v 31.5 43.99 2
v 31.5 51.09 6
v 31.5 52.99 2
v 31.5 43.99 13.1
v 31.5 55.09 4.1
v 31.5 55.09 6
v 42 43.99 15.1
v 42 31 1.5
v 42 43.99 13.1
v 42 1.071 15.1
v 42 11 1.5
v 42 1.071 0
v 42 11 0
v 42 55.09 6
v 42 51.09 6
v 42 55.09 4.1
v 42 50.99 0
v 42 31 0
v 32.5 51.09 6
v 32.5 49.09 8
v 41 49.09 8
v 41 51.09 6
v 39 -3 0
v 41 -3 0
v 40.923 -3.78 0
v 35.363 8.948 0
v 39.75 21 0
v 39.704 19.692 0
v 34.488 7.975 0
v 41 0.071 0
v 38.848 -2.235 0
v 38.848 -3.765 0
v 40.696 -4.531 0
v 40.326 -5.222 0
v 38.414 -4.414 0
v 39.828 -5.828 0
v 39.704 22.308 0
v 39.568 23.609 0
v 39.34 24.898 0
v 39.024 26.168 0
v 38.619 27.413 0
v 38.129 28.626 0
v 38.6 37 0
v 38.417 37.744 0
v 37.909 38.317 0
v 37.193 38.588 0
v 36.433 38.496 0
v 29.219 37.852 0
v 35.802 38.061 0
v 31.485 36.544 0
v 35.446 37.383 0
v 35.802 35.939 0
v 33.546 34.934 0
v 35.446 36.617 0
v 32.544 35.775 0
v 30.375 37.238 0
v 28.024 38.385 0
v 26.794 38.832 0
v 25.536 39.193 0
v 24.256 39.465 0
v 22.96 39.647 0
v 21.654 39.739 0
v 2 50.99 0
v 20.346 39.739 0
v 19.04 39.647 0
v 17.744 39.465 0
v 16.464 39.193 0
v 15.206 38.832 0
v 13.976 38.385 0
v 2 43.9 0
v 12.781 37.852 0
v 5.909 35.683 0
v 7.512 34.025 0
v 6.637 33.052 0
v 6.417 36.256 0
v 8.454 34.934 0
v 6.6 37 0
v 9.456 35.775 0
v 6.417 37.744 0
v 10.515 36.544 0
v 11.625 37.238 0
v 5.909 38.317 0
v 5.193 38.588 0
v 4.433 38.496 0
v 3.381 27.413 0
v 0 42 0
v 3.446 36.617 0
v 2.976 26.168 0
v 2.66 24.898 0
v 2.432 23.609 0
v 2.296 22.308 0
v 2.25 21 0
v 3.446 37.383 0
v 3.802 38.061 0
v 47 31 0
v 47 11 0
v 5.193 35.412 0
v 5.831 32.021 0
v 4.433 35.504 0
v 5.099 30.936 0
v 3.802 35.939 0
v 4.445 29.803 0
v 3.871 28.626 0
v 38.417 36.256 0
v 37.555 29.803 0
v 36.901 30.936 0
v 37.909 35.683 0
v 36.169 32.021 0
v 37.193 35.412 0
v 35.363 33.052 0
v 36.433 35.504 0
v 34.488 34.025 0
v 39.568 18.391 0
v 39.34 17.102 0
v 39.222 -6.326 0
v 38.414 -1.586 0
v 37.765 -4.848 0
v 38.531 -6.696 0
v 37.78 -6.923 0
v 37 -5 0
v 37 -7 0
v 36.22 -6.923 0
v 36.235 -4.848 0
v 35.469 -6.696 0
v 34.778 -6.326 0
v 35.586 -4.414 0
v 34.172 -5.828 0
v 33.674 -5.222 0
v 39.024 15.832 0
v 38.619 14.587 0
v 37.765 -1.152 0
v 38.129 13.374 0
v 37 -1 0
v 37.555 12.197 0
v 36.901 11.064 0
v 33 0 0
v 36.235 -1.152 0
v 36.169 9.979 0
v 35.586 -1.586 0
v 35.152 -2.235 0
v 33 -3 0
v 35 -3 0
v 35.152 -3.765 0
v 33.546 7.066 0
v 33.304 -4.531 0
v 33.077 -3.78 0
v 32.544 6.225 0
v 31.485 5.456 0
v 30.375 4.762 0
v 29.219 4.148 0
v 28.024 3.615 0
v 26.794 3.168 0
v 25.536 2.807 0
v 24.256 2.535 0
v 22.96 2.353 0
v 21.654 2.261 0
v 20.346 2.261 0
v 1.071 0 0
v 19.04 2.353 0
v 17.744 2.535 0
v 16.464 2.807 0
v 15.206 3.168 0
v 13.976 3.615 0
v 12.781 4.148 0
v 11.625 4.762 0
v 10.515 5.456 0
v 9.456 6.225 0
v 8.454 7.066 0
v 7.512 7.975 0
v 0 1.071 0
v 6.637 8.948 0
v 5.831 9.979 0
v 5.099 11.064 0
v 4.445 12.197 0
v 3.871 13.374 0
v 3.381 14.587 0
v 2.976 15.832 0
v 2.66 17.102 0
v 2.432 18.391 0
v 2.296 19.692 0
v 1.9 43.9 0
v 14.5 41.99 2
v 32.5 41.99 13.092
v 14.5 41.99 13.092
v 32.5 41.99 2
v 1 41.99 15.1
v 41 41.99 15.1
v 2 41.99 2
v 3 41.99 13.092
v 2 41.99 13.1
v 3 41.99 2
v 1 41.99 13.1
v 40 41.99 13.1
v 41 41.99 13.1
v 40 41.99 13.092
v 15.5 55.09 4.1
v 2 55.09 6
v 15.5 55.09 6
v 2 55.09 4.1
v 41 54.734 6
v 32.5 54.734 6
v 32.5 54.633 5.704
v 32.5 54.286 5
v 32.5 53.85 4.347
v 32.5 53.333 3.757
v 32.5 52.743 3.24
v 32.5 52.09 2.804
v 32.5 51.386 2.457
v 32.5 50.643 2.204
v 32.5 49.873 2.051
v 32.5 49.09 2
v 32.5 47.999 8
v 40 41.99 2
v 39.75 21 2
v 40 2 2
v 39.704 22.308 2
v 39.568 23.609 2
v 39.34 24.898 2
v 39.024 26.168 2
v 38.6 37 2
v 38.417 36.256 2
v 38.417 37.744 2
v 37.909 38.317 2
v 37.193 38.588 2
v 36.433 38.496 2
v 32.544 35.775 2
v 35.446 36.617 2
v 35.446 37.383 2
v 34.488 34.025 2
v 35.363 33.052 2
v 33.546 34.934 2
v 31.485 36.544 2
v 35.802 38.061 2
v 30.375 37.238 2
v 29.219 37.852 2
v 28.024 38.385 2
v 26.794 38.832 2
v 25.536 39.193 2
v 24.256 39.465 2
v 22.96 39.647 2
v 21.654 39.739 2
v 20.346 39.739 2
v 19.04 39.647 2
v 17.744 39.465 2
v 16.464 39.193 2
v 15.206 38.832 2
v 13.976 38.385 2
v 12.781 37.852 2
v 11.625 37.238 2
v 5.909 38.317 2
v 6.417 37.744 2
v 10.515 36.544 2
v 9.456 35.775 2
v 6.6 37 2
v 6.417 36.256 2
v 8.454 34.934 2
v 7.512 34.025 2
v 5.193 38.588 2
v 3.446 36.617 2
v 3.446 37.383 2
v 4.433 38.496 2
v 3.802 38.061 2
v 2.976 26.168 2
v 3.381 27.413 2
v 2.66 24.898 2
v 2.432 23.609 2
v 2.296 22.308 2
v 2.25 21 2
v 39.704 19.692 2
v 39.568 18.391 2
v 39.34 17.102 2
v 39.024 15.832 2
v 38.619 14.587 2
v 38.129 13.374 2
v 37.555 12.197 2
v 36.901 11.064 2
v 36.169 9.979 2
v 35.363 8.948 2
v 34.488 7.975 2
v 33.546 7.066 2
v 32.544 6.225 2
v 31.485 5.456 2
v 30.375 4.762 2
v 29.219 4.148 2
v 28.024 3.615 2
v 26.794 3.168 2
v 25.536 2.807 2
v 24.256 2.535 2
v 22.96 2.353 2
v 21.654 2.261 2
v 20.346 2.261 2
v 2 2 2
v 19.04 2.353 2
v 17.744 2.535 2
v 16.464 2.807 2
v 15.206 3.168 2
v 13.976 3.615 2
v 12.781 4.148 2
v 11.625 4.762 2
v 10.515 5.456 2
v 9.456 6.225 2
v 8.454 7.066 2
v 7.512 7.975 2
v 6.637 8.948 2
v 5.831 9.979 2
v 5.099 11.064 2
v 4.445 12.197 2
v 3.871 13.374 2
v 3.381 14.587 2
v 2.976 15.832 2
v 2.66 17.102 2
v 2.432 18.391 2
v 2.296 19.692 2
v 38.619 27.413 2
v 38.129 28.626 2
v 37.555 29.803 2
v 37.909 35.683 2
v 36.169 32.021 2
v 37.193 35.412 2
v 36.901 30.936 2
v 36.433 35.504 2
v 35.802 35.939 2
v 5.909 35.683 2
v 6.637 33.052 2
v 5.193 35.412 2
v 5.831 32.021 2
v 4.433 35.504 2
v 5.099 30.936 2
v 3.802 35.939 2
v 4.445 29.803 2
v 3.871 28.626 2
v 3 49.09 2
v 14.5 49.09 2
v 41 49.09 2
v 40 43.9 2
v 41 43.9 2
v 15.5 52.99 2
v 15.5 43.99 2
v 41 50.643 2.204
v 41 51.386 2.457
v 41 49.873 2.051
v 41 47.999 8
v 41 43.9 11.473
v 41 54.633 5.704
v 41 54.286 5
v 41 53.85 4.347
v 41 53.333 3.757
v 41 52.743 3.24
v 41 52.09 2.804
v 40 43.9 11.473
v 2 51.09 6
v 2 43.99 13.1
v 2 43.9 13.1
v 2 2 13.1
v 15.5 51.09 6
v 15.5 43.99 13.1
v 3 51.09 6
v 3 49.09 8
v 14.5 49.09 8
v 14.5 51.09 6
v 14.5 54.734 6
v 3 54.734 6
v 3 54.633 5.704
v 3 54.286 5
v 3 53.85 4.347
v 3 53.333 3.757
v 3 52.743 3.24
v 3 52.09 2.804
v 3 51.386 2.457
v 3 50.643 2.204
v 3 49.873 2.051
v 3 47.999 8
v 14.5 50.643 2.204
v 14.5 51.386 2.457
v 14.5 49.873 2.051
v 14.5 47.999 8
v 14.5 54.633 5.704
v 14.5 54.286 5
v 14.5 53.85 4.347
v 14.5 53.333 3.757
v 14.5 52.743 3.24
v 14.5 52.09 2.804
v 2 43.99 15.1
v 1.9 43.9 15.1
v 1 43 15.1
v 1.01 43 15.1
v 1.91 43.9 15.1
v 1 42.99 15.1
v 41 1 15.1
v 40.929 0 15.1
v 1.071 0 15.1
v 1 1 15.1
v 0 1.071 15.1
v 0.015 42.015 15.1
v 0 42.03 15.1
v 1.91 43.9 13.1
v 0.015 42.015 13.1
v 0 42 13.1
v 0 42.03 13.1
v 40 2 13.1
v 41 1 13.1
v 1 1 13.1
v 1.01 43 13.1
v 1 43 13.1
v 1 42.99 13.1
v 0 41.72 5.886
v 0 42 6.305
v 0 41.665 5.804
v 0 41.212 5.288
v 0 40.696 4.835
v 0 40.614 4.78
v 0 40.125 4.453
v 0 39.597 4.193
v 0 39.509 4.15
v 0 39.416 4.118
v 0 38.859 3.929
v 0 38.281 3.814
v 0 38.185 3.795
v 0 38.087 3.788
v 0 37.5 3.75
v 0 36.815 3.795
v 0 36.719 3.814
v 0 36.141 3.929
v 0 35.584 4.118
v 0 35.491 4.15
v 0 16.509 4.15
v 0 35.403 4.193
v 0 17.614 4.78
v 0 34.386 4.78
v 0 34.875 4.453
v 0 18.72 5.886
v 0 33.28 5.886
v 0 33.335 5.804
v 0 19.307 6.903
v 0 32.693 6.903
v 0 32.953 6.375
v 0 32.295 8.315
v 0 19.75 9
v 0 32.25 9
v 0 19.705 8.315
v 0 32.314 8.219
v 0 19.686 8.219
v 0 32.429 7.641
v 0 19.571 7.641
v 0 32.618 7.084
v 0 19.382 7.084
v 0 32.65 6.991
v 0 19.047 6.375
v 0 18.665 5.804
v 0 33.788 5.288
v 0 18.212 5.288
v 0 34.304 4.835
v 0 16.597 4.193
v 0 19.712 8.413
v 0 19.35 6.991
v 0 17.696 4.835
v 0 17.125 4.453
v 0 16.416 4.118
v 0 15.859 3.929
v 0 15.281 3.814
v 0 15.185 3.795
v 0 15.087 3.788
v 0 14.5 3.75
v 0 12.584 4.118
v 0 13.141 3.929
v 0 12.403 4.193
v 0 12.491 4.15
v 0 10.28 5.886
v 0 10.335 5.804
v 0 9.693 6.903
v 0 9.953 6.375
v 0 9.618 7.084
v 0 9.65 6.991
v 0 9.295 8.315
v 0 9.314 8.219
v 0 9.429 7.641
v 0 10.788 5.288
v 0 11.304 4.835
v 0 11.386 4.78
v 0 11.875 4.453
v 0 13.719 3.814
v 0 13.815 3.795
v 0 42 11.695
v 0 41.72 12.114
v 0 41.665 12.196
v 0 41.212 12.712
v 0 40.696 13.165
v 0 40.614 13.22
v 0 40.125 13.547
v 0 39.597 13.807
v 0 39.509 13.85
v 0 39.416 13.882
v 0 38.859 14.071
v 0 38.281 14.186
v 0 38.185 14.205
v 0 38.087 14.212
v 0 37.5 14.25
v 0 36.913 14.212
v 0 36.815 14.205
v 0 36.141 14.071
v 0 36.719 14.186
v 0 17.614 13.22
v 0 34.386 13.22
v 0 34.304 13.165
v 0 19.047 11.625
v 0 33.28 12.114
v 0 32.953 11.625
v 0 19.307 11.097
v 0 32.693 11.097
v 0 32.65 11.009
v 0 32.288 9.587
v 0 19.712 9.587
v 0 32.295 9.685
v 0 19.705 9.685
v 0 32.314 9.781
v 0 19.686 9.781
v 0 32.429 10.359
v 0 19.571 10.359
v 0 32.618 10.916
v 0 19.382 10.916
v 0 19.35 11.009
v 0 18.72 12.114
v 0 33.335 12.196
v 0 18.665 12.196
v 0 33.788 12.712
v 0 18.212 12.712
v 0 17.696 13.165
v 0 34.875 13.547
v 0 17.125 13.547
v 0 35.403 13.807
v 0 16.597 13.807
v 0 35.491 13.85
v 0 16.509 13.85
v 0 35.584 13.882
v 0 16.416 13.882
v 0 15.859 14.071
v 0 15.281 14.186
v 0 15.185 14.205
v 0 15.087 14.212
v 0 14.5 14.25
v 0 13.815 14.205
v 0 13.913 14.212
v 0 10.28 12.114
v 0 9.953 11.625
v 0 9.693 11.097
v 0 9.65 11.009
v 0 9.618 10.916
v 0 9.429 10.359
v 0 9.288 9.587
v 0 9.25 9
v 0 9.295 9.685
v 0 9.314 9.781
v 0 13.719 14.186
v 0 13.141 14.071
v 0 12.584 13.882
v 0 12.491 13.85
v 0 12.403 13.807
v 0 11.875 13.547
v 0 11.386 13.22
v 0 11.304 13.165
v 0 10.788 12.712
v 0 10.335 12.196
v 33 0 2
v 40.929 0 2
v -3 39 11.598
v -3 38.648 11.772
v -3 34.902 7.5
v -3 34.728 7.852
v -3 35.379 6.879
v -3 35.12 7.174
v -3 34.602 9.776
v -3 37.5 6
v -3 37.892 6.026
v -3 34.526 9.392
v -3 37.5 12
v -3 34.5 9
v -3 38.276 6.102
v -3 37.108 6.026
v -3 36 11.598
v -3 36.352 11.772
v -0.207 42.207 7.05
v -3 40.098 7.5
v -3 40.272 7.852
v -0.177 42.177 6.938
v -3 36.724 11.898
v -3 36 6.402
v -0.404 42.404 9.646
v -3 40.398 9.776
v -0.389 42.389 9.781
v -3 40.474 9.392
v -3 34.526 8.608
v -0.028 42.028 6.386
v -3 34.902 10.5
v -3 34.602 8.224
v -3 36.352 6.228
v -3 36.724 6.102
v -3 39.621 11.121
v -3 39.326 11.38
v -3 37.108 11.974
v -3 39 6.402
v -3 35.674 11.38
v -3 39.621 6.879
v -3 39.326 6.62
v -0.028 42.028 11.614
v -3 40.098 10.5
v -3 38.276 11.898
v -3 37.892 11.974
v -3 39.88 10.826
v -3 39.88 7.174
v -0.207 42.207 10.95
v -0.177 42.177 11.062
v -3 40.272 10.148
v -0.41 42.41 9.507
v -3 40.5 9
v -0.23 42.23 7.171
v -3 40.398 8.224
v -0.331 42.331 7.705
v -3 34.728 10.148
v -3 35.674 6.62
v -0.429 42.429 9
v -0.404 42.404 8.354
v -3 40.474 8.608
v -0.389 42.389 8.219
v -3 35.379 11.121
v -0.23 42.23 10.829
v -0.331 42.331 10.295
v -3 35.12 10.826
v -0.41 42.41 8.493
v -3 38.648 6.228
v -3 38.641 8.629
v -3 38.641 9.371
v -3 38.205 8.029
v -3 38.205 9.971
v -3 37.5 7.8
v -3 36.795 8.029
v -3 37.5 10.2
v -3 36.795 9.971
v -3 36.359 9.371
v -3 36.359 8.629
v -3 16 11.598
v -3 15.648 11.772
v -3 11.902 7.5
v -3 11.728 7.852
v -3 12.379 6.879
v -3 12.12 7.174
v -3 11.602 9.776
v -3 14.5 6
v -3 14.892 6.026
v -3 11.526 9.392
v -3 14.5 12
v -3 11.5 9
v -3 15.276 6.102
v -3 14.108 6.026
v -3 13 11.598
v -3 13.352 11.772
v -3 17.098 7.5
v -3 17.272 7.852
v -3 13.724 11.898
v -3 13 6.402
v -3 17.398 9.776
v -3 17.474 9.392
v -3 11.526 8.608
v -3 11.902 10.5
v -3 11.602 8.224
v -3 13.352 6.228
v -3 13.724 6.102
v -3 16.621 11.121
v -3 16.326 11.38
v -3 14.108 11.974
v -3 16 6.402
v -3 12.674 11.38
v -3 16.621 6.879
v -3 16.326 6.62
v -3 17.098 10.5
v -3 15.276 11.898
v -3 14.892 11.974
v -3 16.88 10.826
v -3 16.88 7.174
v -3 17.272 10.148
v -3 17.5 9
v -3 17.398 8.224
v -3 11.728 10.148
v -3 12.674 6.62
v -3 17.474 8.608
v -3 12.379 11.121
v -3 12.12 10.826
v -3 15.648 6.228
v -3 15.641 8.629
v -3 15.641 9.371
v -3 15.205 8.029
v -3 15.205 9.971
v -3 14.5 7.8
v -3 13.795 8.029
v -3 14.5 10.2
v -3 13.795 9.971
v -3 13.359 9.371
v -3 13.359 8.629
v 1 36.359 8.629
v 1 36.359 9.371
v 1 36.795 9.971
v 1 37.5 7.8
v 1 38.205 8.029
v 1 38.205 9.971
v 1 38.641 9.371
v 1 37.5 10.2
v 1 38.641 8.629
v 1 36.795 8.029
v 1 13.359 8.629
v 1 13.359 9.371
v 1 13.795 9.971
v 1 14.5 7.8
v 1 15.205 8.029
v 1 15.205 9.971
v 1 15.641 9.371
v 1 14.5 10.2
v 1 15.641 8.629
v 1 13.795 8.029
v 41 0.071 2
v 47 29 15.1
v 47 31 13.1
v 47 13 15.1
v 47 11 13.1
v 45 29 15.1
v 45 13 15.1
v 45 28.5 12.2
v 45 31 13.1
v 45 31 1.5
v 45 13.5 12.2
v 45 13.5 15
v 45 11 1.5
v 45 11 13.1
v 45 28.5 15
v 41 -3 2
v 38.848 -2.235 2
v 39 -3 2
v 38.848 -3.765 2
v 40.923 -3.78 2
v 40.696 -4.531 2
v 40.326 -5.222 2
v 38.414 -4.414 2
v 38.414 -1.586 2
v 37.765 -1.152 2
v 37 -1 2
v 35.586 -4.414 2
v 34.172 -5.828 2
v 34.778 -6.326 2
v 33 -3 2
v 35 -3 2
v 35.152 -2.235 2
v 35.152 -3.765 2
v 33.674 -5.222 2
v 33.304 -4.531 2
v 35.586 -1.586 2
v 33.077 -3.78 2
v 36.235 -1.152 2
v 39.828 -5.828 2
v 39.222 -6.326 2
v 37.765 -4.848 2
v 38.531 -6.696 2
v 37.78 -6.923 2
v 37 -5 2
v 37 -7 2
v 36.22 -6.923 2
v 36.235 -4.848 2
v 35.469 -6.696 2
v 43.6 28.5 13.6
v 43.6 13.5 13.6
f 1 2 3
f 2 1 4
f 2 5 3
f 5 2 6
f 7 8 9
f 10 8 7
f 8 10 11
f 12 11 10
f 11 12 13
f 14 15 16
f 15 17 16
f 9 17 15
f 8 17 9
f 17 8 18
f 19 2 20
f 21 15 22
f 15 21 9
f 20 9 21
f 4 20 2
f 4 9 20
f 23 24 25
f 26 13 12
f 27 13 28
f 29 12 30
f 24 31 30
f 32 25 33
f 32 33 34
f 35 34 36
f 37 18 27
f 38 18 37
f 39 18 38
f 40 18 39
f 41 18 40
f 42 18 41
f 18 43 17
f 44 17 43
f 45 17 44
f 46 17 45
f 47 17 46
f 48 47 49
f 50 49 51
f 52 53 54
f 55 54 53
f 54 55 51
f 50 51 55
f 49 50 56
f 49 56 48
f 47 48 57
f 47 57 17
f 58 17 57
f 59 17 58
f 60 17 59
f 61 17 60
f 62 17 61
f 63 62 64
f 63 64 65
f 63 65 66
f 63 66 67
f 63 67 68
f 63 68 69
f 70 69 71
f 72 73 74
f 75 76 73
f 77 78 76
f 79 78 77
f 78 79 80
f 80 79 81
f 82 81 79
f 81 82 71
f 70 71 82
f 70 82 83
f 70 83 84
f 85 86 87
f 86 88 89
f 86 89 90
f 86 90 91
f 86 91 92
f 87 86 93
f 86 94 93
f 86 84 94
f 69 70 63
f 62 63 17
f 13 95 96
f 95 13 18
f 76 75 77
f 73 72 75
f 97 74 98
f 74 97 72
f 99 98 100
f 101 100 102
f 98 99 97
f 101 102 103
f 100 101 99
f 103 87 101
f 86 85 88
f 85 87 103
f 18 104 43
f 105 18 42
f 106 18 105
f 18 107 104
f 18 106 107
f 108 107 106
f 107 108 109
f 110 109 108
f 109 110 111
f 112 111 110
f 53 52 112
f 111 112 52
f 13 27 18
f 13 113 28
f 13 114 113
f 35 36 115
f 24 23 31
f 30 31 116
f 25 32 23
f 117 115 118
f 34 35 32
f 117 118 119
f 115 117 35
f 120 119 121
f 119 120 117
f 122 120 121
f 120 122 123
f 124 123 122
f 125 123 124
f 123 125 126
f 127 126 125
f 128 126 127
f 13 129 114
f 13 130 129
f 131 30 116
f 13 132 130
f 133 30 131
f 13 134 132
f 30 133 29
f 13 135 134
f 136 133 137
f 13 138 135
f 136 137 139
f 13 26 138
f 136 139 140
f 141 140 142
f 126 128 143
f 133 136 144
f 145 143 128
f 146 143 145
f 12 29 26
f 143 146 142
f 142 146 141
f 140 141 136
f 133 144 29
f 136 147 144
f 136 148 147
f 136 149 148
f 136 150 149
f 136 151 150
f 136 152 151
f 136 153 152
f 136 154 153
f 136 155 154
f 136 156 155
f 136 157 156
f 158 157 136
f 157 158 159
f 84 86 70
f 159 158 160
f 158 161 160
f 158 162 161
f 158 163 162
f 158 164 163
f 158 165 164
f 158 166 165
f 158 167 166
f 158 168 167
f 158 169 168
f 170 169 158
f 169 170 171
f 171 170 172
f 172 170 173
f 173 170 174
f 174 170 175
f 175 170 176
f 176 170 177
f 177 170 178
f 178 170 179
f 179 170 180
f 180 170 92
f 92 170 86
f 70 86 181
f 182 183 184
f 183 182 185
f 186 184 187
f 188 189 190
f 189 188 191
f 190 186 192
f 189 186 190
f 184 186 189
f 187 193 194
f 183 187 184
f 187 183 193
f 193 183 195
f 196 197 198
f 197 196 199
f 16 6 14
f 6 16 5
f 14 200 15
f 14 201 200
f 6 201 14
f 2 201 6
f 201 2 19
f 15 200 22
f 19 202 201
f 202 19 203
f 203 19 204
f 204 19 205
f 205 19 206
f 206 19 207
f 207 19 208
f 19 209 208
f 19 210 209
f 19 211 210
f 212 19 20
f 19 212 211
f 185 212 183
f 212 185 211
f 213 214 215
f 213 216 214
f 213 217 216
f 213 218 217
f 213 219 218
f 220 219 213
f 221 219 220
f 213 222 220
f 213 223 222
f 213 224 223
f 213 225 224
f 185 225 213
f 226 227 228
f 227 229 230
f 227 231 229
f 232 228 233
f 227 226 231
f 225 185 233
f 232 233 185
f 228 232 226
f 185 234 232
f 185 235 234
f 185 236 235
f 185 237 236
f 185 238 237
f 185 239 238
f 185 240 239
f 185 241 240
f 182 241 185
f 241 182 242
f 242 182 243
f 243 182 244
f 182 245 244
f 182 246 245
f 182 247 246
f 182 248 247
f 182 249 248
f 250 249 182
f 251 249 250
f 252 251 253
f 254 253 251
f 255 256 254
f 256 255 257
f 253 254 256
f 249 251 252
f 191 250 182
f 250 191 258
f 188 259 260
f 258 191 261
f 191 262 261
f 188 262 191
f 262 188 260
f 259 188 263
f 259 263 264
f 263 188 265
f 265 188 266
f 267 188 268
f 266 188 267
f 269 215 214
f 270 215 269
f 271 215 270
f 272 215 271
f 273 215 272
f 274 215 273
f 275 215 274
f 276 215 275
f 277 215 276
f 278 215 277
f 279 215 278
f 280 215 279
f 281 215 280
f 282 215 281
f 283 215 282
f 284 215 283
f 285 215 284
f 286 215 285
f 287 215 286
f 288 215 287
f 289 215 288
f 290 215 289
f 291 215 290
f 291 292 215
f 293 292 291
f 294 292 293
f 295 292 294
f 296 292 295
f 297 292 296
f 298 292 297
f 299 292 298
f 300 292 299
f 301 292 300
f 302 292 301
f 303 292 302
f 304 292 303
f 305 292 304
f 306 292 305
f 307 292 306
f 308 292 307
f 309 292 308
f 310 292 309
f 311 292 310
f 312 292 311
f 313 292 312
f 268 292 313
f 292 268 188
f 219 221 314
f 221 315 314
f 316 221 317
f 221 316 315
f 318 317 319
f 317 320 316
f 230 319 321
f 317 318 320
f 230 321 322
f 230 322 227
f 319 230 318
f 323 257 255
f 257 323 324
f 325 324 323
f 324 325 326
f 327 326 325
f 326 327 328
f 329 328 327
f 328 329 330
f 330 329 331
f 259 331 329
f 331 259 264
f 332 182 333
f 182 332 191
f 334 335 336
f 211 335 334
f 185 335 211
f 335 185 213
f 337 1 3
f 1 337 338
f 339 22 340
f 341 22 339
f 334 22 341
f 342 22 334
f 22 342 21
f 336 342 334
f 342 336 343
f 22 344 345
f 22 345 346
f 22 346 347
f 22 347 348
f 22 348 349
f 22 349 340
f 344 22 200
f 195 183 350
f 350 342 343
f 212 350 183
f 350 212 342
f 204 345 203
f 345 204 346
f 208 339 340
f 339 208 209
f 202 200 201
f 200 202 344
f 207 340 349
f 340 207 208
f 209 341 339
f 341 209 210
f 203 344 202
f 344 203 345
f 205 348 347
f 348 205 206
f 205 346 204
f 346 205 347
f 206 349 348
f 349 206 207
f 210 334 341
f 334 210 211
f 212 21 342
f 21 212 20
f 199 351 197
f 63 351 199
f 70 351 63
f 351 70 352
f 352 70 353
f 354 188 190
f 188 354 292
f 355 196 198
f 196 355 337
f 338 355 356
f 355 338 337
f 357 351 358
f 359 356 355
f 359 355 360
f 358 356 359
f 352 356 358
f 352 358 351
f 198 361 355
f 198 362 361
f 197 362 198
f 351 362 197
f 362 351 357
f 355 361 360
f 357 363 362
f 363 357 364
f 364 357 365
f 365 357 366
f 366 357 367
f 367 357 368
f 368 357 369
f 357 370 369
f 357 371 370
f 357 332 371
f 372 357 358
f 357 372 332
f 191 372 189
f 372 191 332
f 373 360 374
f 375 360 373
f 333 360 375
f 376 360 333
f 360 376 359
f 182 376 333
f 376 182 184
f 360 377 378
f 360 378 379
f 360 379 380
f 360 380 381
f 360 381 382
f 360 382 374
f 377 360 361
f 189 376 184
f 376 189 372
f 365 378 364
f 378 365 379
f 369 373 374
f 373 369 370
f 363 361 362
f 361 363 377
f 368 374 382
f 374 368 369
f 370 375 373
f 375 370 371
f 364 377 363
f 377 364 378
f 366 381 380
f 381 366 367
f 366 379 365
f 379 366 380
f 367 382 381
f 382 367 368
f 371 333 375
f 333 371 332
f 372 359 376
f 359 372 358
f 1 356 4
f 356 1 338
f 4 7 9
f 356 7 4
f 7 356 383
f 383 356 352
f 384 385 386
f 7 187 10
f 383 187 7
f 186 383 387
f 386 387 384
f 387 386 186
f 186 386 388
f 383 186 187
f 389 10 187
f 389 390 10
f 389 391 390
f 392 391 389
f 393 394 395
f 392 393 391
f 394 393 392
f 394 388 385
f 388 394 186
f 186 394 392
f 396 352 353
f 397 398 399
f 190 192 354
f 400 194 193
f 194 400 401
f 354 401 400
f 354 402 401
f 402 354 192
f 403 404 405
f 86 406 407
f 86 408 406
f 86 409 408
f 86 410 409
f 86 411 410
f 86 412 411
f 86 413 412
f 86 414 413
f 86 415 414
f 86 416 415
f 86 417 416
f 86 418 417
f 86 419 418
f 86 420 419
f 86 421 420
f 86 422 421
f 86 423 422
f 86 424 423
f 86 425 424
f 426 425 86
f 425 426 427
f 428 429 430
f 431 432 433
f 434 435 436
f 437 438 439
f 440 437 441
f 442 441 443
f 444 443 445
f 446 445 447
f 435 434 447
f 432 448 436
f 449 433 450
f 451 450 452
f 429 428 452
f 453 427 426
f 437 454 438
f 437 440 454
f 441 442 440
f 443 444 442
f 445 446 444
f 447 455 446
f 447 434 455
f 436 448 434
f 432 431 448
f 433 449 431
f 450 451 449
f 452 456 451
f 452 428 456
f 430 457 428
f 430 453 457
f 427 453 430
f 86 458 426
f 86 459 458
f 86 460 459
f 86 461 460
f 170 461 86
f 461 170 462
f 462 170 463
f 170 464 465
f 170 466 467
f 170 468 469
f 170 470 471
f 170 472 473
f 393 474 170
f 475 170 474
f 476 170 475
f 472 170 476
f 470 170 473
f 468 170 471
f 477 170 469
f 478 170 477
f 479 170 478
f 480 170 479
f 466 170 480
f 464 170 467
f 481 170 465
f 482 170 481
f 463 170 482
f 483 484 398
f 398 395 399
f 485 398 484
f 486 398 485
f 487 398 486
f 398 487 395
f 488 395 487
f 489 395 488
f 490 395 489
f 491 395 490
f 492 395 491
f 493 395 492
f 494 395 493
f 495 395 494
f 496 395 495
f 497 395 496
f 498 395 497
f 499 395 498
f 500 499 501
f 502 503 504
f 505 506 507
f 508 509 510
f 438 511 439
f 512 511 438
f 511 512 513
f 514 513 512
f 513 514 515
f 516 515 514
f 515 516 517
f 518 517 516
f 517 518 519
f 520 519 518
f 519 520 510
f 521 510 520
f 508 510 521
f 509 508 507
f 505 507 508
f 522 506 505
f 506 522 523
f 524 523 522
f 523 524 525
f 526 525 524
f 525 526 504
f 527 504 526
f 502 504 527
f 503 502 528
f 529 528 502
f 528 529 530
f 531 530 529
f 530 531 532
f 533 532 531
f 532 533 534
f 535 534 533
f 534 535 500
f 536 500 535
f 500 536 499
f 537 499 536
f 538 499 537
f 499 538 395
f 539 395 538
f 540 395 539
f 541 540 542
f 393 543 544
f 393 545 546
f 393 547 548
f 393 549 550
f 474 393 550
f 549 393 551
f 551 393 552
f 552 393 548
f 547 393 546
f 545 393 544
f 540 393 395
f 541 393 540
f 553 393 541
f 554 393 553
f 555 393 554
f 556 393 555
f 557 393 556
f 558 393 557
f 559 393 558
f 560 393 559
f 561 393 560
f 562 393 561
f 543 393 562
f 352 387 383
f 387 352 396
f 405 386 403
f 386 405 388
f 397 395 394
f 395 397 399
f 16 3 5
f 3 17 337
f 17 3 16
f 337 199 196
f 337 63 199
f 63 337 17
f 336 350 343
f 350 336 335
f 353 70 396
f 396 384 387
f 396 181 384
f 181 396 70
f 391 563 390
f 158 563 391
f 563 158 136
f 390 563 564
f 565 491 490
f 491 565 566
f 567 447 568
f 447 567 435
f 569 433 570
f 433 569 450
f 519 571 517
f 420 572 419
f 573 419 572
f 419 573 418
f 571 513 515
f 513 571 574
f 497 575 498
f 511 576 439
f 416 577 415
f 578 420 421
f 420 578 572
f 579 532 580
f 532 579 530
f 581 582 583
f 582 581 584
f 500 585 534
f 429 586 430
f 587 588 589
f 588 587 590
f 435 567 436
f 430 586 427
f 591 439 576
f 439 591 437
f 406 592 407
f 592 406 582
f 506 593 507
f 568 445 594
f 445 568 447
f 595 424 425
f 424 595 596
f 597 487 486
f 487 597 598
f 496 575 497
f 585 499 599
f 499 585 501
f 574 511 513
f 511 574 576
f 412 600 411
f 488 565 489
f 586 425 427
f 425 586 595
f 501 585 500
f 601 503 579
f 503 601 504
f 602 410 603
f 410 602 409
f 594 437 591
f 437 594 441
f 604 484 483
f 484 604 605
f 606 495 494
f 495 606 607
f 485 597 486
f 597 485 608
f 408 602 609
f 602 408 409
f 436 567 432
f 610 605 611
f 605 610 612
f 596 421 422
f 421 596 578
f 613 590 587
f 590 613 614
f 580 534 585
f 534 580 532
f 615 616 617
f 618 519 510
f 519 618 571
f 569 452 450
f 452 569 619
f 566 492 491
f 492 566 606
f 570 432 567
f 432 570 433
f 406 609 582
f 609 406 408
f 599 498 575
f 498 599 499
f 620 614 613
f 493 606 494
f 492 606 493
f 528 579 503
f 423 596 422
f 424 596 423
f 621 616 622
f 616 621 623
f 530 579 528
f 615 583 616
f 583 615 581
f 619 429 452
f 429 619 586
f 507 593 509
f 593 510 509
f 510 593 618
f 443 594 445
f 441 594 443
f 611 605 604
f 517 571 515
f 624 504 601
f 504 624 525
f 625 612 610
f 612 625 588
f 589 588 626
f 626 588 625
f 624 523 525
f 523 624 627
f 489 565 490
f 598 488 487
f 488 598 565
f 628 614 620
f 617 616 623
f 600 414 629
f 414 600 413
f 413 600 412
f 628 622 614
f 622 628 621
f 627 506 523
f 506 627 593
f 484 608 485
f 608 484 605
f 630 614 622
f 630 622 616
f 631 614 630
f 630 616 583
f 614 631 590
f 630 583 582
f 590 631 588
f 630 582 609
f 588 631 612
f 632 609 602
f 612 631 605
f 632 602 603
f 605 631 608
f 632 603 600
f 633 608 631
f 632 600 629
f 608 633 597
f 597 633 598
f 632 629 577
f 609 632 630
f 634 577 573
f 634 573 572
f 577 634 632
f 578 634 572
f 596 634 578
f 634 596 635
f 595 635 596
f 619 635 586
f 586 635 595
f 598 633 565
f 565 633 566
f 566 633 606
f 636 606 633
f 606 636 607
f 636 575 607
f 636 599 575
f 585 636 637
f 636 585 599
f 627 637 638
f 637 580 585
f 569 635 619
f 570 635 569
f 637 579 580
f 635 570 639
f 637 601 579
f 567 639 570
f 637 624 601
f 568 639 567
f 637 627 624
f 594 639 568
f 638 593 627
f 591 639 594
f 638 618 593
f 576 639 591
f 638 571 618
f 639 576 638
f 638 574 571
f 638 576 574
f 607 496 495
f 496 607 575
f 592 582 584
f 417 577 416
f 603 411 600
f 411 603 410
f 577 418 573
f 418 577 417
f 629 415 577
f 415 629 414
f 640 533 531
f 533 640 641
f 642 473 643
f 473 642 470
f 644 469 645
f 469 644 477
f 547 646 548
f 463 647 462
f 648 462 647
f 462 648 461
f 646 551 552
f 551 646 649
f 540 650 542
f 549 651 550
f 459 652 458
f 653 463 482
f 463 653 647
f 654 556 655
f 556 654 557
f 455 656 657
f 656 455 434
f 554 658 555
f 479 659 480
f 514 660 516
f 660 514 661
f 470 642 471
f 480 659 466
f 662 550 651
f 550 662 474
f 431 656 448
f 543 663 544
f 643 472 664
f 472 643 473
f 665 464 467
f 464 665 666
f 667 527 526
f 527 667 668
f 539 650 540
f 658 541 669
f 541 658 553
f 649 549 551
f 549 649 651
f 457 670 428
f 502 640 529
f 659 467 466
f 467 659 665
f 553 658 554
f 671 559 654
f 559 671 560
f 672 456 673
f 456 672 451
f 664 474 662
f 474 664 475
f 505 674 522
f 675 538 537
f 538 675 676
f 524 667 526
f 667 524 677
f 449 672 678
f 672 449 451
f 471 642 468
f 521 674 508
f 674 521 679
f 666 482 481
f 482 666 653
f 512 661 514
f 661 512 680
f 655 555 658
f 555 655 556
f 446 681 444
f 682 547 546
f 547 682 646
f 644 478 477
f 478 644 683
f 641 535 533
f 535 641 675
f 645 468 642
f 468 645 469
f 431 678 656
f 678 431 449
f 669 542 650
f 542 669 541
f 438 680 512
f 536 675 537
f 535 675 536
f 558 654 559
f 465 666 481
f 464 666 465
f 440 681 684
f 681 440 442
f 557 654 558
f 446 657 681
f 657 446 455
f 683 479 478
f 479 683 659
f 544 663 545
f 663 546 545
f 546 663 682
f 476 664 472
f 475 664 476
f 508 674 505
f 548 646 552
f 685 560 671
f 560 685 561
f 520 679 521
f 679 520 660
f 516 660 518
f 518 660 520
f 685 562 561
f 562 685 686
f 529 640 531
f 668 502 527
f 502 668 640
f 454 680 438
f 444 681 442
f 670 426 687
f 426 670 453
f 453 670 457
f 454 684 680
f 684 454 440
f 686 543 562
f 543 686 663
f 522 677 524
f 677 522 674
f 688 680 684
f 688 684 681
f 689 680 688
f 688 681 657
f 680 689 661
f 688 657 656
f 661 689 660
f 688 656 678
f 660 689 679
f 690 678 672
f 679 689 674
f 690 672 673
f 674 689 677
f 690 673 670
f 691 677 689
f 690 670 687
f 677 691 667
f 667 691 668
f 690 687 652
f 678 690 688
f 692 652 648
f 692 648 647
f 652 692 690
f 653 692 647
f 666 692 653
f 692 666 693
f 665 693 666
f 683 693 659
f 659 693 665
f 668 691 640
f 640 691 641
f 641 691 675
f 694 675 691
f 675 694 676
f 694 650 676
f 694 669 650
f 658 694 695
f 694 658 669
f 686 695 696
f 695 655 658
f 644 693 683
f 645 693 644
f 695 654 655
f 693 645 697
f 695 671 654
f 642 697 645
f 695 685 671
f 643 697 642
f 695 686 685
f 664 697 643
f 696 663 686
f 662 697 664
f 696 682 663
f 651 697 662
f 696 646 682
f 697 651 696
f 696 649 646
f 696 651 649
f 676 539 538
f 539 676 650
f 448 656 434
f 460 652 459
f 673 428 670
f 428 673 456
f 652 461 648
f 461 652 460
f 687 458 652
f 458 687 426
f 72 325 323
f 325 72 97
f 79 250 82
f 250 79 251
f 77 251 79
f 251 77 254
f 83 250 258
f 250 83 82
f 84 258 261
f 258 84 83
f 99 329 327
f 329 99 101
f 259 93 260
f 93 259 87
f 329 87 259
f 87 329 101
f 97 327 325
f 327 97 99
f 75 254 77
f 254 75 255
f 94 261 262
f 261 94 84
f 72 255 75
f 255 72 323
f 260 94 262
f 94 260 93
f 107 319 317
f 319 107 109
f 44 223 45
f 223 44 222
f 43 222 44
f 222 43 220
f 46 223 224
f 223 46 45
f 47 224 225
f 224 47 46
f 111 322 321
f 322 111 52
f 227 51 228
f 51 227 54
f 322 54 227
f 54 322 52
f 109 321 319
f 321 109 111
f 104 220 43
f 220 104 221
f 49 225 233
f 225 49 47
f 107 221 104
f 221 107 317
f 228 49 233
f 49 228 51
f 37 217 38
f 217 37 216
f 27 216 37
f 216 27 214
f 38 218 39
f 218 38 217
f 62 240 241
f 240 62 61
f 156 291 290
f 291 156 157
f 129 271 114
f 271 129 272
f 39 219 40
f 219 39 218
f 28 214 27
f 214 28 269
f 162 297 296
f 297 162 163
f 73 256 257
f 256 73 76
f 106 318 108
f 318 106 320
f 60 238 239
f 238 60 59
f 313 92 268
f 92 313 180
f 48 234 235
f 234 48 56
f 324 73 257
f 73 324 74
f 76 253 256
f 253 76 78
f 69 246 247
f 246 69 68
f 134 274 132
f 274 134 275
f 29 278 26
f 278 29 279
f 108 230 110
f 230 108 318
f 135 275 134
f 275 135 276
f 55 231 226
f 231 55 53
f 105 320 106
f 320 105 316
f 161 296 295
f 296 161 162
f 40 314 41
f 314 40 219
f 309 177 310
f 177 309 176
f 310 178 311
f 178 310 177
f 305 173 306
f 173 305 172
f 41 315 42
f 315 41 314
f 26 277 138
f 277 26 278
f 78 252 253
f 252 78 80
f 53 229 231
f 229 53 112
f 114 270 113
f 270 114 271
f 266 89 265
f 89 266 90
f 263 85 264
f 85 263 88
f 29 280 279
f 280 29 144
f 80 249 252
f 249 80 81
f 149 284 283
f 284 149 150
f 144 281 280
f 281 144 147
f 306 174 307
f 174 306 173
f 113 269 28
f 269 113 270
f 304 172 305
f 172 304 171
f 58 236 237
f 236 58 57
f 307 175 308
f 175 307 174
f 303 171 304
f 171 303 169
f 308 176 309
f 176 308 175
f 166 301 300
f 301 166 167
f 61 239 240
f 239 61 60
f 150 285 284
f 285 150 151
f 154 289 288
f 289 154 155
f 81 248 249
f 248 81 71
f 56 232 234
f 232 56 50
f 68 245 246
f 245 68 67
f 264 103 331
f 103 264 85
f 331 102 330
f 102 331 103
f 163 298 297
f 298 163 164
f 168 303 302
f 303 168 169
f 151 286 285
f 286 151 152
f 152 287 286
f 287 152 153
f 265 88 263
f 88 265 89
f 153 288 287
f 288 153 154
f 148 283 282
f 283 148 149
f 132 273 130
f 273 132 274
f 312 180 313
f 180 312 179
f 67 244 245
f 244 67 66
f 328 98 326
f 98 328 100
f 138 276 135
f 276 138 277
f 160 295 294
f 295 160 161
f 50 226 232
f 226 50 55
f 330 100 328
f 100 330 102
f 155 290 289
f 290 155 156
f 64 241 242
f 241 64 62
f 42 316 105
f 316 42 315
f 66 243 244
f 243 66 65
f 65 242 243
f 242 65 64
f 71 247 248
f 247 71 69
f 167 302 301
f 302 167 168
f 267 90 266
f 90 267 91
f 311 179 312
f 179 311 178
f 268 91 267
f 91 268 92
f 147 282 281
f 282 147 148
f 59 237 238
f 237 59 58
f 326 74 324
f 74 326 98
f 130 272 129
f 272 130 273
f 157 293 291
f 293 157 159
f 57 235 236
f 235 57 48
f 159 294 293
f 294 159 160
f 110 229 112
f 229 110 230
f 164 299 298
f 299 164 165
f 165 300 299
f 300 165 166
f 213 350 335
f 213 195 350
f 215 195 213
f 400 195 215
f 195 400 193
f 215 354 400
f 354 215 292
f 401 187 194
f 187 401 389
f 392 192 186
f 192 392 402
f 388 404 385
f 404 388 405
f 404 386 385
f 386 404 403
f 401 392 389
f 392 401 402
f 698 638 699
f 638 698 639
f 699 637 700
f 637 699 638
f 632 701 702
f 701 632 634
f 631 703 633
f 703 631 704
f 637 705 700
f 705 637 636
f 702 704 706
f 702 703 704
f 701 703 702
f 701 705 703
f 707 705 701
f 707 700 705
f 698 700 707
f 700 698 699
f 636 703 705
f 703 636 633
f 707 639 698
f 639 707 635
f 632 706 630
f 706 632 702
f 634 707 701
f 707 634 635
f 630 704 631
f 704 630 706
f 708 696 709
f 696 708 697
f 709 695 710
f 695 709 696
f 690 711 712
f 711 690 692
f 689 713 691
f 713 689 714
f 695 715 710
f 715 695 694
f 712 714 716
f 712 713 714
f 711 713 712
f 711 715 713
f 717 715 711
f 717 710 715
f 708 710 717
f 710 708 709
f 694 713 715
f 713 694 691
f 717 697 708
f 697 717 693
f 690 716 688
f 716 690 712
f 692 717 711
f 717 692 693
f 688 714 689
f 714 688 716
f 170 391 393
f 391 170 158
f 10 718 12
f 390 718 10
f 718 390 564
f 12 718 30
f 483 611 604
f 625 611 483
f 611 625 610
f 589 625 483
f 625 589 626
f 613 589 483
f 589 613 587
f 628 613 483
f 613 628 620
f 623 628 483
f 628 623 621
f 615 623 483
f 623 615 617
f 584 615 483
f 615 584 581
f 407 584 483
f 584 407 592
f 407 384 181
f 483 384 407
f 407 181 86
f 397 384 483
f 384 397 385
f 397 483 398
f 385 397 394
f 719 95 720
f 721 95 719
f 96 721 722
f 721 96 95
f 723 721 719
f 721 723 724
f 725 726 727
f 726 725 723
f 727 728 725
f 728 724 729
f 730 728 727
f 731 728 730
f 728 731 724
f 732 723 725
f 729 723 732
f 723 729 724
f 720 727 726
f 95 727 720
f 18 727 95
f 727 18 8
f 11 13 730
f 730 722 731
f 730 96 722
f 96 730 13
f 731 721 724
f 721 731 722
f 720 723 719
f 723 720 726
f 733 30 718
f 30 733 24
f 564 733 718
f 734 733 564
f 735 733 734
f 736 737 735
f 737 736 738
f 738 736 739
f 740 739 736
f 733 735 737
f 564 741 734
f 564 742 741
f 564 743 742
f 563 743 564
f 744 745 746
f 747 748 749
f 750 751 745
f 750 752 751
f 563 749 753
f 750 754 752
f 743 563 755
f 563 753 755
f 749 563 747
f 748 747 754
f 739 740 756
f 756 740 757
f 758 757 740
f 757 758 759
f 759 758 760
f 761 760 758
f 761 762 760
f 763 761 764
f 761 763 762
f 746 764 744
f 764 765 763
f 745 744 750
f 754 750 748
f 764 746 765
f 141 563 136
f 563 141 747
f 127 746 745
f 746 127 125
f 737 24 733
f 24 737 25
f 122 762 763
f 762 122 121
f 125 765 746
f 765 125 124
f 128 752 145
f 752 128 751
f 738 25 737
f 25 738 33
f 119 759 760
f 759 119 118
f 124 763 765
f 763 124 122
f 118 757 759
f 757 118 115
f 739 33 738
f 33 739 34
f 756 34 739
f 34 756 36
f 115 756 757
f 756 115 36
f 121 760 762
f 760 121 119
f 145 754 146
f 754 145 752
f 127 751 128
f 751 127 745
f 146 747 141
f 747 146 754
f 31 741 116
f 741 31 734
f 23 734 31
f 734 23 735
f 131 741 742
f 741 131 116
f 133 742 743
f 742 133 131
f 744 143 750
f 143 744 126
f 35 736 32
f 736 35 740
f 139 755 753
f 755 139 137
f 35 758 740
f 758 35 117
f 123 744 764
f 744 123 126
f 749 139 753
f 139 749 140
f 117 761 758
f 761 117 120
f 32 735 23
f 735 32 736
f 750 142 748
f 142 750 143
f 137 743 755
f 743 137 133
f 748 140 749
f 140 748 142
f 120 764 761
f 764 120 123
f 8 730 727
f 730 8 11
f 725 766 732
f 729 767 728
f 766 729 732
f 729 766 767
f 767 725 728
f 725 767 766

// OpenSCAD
// Original design by Matt (iamburny)
// Changes by dc42:
// 1. Increased thickness of cable trap from 1.5mm to 2mm because mine broke
// 2. Replaced tie wrap T at top centre by tie wrap hole at top right

$fs=0.8; // def 1, 0.2 is high res
$fa=4;//def 12, 3 is very nice
%translate([0,0,-0.5])cube([200,200,1],center=true); //build platform

irSensorOffset = 0.5;
sc = 32; //Screw Centres
wall=2;
hole = 37.5;  //fan hole
x=42;
y=x;
z=15.10;
heo = 2.5; //hot end offset
hbr = 16; //heat block recess

size=11; // size of the ball joint
joint_spacing =0; // some space between them?
joint_thickness = 3; // thickness of the arms - was 2
joint_arms = 2; // how many arms do you want?
arm_width = 5; // actually: how much is removed from the arms Larger values will remove more - was 10

ventB=(x/2)-(hbr/2)+heo-2;
ventS=(x/2)-(hbr/2)-heo;

module ball() {
	sphere(r=size);
	translate([0,0,-size]) cylinder(r1=8,r2=6,h=3);
	translate([0,0,-size-3]) cylinder(r=8,h=3);
}

module joint() {
	difference() 	{
		sphere(r=size+joint_spacing+joint_thickness);
		sphere(r=size+joint_spacing);
		translate([0,0,-size-3]) cube([size+joint_spacing+joint_thickness+25,size+joint_spacing+joint_thickness+25,18],center=true);
		for(i=[0:joint_arms])
		{
			rotate([0,0,360/joint_arms*i]) translate([-arm_width/2,0, -size/2-4])
				cube([arm_width,size+joint_spacing+joint_thickness+20,size+6]);
		}
	}
	translate([0,0,size-0]) cylinder(r2=12,r1=12,h=5);

}

module prism(l, w, h) {
	translate([0, l, 0]) rotate( a= [90, 0, 0]) 
	linear_extrude(height = l) polygon(points = [
		[0, 0],
		[w, 0],
		[0, h]
	], paths=[[0,2,1]]);
}

module vHole(len) {
	difference() {
		union() {
			cube([10-6,len,6]);
			translate([10-6,len,6]) rotate([90,0,0]) cylinder(len,6,6);
		}
		translate ([-7,-1,6]) cube([16,len+2,10]);
		translate ([-7,-1,0]) cube([6,len+2,7]);
	}
}

//Vents
translate([x,y-0.01,0]) rotate([0,0,90]) {
	difference() {
		union() {
			difference() { //Small Vent
				union() {
					prism(ventS,z,z);
					translate([z-6,0,0]) cube([4,ventS,6]); //tip
				}
				difference() {
					translate([-.01,wall/2,wall]) prism(ventS-wall,z-wall, z-wall*2);
					translate([6,0,0]) cube([6,ventS,6]);
				}
				translate([z-12,wall-1,wall]) vHole(ventS-(wall));
			}

			translate([0,ventS+hbr,0]) { 
				difference() { //Big Vent
					union() {
						prism(ventB,z,z);
						translate([z-6,0,0]) cube([4,ventB,6]);
					}
					difference() {
						translate([-.01,wall/2,wall]) prism(ventB-wall,z-wall,z-wall*2);
						translate([6,0,0]) cube([6,ventB,6]);
					}
					translate([z-12,wall-1,wall]) vHole(ventB-(wall));
				}
			}
			
			cube([z-2,y-2,wall]); //vent Base
			translate([0,ventS,wall]) cube([wall,hbr,z-(wall*2)]); //vent join			
			
			difference() {
				translate([0,0,z-wall]) cube([wall,y,wall]); //top of slope edging strip
				translate([2,y-2,-1]) rotate([0,0,45]) cube([2.8,2.8,z+2]); //bottom right bevel
			}
		}
		translate([9,-1,0]) rotate([0,45,0]) cube([10,y+2,10]); //vent bottom bevel
	}
}

//Body
difference() {
	union() {
		cube([x,y+1.9,z]); //outer block
	translate([-3,((x-sc)/2) + sc + irSensorOffset ,9]) rotate([0,90,0]) cylinder(4,3,6);	// sensor board mount
	translate([-3,((x-sc)/2) + sc + irSensorOffset - 23,9]) rotate([0,90,0]) cylinder(4,3,6);	// sensor board mount	

	}
	translate([x/2,x/2,-.1]) cylinder(20,hole/2,hole/2); //fan hole
	
	translate([wall,wall,2]) cube([x-(wall*2), x, 20]); //heatsink hole
	translate([wall-1,wall-1,z-2]) cube([x-(wall), x, 20]); //heatsink recess
	for(xp = [0:1]) { //2 x screw holes
		translate([((x-sc)/2) + (xp*sc),((x-sc)/2) + sc,-.1]) cylinder(3,1.6,1.6);
	}
	
	translate([-4,((x-sc)/2) + sc + irSensorOffset,9]) rotate([0,90,0]) cylinder(h=5,r=1.2);	// sensor board hole
	translate([-4,((x-sc)/2) + sc + irSensorOffset - 23,9]) rotate([0,90,0]) cylinder(h=5,r=1.2);	// sensor board hole
	
	translate([0,-6,-1]) rotate([0,0,45]) cube([5,5,z+2]); // top bevel
	translate([x,-6,-1]) rotate([0,0,45]) cube([5,5,z+2]); //top bevel
	translate([0,y,-1]) rotate([0,0,45]) cube([2.7,2.7,z+2]); //bottom right bevel
}

//Cable Traps
translate([x,(y/2)-10,0]) cube([wall*2,20,1.5]); //right cable trap
difference() {
	translate([x+3,(y/2)-10,0]) cube([2,20,z]); //right cable trap
	translate([x+2,(y/2)-10,z-2]) rotate([45,0,0]) cube(3); //right cable trap bevel
	translate([x+2,y-11,z-2]) rotate([45,0,0]) cube(3); //right cable trap bevel
}
translate([x+1.6,(y/2)-7.5,z-1.5]) rotate([0,45,0]) cube([2,15,2]); //right cable trap catch


//Tie Wrap hole
difference() {
	union() {
		translate([x-9,-3,0]) cube([8,4,2]);
		translate([x-5,-3,0]) cylinder(r=4,h=2);
	}
	translate([x-5,-3,-1]) cylinder(r=2,h=4);
}

/*Ball Joint
difference() {
	union() {
		rotate([0,90,0]) scale(.5)  translate([-size+1,size,97]) ball();
		//translate([20,20,2.4]) scale(.5) joint();
	}
	translate([0,0,-6]) cube([100,100,6]);
	translate([20,20,2.4]) cylinder(20,1.5,1.5);
}
*/
